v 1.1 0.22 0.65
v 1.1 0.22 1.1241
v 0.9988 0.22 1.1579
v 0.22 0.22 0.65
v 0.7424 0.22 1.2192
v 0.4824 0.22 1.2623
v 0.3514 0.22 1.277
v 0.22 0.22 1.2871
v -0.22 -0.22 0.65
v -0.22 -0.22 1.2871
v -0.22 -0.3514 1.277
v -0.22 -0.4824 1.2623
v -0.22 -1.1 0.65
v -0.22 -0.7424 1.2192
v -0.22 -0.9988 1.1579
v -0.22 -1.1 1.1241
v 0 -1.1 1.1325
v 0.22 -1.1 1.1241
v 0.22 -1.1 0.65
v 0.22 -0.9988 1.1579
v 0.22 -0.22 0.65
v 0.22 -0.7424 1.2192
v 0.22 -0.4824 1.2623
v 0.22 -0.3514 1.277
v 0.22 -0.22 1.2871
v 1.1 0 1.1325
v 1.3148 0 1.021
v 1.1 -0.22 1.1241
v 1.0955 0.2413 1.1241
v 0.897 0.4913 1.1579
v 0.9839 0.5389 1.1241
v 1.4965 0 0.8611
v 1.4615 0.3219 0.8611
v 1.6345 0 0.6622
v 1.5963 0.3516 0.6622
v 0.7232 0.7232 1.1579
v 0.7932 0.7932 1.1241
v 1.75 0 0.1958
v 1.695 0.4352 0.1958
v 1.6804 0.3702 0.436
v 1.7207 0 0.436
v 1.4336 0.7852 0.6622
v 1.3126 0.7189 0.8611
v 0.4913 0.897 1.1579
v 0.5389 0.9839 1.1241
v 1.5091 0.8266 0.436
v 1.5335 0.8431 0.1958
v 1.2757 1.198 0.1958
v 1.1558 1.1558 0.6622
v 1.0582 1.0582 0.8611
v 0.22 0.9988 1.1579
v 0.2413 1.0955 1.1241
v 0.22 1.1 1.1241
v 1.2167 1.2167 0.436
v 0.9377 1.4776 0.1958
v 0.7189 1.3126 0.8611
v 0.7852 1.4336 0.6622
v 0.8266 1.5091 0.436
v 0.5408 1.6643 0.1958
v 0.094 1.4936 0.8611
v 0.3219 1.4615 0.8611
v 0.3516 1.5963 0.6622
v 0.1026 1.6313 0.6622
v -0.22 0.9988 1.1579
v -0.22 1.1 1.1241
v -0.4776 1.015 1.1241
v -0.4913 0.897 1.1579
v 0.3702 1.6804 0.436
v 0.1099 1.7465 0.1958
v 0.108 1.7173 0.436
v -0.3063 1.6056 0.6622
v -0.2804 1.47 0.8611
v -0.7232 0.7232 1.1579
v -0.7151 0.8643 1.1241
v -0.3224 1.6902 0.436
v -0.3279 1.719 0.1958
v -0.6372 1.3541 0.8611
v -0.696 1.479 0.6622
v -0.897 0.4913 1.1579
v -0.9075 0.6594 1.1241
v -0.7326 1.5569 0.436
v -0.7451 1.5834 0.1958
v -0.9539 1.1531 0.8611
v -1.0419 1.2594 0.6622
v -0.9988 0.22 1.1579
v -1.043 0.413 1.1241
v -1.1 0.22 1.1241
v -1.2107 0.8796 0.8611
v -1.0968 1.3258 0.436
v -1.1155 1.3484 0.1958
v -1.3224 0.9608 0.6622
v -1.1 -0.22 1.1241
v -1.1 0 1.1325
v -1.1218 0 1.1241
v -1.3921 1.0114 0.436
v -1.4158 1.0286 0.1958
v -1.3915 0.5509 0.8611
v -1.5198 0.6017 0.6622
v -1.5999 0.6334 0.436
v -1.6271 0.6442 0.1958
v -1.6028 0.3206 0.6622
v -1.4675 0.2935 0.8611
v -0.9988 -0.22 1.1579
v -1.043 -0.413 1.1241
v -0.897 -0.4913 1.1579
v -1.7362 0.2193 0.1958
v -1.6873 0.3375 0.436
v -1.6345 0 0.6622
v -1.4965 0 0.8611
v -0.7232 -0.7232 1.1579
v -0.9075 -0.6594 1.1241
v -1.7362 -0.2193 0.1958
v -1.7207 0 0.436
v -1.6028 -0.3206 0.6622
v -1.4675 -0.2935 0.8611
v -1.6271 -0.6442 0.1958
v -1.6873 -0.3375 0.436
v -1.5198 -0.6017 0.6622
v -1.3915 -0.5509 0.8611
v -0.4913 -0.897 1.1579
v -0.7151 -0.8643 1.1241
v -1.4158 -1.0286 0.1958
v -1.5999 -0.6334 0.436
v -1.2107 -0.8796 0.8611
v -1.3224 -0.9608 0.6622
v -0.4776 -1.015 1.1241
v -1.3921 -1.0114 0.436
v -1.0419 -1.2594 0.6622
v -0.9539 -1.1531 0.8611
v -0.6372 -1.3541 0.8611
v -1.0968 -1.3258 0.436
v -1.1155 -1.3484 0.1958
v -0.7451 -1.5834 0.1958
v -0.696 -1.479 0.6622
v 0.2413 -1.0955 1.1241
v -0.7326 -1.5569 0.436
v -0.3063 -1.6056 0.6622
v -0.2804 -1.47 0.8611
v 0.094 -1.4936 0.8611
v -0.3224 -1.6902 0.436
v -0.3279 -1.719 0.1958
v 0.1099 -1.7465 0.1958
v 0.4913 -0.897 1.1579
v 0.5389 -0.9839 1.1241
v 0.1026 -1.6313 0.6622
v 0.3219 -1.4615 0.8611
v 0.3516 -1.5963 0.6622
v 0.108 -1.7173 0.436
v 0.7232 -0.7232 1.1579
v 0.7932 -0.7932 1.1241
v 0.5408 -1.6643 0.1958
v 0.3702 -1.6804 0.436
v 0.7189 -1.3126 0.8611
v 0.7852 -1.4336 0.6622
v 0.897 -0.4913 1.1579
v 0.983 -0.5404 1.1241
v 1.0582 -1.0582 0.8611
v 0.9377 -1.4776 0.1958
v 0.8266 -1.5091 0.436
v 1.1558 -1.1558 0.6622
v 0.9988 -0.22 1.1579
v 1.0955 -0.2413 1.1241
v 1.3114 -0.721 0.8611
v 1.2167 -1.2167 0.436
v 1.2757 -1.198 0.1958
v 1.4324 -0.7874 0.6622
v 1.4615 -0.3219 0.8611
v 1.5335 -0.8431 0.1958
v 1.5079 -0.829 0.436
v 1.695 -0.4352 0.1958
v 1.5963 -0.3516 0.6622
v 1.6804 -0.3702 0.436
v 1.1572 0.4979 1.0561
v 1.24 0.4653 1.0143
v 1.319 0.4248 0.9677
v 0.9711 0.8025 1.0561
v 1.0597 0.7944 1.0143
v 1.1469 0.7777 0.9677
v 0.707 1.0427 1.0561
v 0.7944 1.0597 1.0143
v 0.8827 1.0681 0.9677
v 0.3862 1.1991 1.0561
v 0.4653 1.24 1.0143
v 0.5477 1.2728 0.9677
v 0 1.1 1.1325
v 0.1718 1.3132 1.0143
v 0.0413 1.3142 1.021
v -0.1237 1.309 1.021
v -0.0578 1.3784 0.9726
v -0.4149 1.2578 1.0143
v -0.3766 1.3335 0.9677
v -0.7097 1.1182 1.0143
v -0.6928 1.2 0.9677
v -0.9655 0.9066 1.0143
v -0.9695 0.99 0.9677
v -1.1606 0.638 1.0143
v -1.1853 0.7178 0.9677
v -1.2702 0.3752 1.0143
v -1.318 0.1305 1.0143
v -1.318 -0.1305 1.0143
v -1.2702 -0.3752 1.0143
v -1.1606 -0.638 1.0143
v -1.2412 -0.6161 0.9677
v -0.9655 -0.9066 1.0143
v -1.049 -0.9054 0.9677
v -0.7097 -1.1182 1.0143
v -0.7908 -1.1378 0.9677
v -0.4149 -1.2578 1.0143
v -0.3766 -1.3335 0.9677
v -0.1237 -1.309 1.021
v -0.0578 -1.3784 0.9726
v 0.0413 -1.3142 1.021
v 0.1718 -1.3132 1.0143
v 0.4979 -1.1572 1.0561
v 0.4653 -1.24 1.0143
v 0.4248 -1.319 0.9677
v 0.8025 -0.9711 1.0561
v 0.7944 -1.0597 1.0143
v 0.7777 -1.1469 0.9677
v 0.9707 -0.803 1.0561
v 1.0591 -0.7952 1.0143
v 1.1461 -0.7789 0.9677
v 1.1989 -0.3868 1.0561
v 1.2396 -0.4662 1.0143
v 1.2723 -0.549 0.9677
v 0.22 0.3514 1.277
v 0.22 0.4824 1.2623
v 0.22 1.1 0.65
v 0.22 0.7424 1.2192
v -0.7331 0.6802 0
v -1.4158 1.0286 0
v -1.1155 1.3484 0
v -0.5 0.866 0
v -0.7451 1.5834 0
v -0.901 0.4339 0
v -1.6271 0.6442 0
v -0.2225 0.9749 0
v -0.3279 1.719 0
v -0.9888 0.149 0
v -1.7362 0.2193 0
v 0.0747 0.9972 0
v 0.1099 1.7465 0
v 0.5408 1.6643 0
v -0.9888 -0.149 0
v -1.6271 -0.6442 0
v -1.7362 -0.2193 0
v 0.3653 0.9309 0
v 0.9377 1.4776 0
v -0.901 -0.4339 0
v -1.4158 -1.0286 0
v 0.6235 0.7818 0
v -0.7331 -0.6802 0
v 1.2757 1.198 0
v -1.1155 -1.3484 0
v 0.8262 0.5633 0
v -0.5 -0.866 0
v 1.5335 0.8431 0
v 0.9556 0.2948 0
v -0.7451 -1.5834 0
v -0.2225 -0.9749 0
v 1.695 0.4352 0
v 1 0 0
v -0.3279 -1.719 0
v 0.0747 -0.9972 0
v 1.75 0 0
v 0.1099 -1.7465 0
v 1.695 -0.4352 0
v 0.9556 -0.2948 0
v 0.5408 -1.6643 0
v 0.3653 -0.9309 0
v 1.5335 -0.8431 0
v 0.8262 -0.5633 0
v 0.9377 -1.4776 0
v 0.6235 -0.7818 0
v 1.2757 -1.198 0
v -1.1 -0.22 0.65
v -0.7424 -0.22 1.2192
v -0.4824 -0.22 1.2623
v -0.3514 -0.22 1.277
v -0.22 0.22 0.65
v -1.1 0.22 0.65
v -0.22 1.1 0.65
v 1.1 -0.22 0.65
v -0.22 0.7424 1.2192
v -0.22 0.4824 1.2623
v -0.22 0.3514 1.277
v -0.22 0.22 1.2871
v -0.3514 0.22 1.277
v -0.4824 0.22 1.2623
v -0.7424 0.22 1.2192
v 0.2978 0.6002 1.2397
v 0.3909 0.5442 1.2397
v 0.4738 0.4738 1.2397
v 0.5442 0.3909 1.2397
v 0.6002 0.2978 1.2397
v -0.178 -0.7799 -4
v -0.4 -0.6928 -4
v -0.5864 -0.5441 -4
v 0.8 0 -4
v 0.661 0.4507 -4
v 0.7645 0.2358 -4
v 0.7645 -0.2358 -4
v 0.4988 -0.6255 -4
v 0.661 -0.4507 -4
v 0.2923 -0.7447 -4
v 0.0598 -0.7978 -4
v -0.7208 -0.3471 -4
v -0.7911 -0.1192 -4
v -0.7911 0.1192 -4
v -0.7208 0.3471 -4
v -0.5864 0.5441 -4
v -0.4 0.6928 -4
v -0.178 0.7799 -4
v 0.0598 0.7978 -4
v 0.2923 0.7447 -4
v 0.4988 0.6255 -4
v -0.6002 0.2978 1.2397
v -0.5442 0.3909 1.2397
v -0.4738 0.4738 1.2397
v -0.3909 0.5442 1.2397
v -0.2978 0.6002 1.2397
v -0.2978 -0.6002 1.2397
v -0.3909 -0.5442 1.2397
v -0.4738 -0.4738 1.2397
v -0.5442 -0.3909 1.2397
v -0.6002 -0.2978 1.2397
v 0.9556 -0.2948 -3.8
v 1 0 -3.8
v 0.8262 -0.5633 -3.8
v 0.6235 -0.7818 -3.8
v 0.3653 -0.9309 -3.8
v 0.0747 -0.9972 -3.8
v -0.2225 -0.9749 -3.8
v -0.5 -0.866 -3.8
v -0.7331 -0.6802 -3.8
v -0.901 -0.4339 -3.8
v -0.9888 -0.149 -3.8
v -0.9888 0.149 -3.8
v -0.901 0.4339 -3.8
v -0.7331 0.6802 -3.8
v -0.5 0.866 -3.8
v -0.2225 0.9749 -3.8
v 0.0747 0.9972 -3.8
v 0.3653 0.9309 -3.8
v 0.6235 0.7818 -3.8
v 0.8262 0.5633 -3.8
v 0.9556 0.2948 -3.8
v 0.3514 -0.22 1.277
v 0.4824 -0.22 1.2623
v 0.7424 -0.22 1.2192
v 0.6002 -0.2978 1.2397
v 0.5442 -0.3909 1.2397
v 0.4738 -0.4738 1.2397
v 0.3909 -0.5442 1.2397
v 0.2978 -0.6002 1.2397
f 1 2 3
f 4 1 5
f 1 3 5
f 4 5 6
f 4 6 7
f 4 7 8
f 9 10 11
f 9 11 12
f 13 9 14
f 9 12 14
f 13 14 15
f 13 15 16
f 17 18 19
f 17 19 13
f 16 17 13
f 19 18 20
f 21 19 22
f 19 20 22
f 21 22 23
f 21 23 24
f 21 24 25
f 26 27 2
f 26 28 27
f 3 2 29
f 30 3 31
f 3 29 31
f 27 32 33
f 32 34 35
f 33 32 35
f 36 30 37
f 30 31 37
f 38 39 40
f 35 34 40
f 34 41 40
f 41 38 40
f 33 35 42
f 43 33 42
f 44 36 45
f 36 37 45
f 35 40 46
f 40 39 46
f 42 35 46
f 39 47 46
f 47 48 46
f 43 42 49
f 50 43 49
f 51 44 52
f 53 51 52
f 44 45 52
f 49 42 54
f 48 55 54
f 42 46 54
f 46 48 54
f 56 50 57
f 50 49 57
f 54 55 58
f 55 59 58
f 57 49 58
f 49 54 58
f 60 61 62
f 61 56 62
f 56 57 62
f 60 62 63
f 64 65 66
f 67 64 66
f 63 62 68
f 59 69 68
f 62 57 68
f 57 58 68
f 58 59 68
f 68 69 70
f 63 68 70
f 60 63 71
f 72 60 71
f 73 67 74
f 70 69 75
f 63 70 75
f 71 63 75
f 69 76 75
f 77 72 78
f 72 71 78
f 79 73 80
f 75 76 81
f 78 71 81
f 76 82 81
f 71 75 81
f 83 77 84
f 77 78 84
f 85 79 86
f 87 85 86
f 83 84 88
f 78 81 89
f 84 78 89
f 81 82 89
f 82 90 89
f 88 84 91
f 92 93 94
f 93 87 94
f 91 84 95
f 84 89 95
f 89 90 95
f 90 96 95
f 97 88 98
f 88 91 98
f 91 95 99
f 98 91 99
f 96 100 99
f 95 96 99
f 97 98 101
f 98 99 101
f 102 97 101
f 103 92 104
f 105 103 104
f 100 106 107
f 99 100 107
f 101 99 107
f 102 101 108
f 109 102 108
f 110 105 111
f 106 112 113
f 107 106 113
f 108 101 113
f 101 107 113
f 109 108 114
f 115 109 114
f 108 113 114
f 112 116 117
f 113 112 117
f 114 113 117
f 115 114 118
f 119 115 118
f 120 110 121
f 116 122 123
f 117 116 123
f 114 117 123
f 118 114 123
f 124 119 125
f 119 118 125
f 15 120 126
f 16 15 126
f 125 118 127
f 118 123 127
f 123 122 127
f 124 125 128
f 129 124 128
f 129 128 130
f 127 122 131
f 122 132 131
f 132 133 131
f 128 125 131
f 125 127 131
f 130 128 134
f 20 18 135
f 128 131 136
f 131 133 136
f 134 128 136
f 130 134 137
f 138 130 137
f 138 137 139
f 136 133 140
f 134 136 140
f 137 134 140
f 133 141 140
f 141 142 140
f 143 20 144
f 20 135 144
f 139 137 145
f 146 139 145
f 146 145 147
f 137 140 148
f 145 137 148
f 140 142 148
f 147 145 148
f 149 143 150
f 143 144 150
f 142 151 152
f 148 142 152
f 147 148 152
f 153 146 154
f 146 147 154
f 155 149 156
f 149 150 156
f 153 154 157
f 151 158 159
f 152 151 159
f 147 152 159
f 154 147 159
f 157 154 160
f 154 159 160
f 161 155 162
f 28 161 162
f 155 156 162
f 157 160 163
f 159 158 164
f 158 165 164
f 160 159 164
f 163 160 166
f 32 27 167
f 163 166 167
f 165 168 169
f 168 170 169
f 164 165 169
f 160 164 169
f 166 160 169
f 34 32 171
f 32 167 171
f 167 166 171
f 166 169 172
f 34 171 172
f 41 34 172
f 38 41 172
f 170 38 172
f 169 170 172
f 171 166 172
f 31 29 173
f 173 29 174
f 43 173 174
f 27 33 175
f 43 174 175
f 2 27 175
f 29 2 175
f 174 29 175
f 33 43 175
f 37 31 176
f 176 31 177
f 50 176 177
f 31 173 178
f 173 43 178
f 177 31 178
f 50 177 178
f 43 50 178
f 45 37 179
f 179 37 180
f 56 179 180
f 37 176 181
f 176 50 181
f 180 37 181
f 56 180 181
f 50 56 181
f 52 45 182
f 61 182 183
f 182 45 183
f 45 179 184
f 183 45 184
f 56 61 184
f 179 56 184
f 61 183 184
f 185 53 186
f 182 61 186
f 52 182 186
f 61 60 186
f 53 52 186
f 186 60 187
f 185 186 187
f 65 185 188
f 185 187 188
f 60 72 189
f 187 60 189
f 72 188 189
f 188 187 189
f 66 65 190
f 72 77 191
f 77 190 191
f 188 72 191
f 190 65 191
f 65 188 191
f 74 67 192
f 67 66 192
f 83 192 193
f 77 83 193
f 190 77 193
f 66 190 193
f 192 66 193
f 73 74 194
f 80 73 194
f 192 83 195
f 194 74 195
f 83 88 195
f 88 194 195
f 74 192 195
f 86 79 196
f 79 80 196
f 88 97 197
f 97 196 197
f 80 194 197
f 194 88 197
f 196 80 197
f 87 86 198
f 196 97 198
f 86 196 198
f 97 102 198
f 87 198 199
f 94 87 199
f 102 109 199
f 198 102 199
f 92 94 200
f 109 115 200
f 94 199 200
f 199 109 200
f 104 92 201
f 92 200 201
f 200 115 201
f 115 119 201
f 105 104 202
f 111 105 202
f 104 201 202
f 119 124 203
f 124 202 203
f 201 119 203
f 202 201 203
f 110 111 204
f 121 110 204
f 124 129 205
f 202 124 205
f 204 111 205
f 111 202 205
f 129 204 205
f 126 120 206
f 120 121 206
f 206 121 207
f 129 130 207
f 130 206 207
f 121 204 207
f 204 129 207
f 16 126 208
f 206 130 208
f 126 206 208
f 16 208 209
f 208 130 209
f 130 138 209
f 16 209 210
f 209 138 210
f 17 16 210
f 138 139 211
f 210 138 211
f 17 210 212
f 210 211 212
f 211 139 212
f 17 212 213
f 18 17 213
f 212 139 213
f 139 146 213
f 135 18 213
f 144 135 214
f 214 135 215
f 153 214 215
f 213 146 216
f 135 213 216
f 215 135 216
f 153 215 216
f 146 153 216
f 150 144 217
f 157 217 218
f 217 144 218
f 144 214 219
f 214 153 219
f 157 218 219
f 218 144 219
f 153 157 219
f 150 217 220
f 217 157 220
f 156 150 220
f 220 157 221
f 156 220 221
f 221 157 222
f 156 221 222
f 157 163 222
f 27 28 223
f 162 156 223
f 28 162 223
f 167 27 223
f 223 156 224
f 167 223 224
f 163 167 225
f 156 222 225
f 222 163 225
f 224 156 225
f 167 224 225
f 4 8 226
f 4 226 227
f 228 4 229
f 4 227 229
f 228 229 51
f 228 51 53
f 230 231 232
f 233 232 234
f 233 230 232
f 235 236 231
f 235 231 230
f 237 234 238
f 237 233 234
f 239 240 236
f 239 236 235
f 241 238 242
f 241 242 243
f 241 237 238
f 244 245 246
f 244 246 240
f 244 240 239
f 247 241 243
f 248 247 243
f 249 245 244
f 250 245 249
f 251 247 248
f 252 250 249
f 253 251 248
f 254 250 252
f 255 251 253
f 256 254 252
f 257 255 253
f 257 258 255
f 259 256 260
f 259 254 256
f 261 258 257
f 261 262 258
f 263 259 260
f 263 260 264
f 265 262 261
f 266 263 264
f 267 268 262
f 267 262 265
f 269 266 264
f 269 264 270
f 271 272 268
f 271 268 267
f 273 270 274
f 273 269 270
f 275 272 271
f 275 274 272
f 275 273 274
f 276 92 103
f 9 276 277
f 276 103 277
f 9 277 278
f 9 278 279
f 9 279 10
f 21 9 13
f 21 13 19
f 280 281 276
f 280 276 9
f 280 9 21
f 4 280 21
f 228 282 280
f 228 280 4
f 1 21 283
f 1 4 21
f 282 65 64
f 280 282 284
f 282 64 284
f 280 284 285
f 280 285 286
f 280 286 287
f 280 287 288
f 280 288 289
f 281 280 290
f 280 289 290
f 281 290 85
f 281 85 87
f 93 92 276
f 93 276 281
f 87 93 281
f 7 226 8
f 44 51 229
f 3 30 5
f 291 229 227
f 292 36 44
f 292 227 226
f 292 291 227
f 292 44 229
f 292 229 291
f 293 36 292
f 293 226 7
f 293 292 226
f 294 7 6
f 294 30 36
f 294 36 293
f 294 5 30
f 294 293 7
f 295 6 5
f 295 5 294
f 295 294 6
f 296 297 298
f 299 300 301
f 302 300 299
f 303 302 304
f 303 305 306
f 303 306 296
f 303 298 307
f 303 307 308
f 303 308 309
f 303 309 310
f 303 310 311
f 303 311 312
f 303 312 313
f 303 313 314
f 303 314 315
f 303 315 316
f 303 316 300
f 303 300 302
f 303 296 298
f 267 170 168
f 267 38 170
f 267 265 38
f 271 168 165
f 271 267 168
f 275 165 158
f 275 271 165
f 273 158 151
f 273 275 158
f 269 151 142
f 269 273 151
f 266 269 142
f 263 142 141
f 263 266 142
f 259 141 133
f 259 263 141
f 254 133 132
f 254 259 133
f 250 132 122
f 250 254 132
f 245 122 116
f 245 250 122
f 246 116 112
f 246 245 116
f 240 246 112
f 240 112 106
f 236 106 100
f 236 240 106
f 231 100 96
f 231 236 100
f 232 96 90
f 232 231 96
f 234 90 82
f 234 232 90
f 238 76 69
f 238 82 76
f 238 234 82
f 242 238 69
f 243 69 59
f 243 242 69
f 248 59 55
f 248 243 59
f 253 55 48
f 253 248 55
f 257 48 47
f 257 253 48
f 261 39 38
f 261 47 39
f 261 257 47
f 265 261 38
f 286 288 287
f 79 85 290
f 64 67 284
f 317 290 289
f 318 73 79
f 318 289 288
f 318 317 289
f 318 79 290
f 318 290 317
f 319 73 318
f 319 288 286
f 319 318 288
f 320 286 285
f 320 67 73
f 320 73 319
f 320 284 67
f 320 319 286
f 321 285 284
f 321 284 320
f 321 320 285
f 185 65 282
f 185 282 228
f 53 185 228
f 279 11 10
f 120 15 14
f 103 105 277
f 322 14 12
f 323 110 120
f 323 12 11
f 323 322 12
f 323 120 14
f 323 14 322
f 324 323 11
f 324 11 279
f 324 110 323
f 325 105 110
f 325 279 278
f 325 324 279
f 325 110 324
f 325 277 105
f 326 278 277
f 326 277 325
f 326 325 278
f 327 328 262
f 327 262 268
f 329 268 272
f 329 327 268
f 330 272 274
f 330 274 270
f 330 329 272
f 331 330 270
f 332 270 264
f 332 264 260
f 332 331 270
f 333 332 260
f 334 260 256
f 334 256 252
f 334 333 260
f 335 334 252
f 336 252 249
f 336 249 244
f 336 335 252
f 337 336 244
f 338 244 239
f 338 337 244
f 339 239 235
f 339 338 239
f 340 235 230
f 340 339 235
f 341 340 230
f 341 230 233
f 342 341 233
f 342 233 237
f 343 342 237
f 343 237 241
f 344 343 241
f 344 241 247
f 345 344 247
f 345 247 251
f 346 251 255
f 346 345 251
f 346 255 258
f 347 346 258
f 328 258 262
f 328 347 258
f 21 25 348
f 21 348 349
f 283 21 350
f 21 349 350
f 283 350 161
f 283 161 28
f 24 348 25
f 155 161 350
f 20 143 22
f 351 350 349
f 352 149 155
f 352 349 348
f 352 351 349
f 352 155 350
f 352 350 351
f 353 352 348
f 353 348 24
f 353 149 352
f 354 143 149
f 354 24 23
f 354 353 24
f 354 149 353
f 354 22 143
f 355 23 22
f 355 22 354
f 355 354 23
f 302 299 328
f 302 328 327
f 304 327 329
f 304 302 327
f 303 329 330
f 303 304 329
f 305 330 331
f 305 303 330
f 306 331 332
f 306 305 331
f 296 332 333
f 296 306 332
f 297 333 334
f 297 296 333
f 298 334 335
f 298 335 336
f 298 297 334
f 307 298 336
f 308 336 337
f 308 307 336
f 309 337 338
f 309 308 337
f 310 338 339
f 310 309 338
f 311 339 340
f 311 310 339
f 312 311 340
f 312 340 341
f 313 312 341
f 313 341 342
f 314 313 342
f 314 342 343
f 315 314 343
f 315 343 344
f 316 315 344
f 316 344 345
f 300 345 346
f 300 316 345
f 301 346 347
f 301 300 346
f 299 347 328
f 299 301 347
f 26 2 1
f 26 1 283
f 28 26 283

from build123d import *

# Parameters (mm, degrees)
CUT_EXTRUDE2_DEPTH = 0.65
CHAMFER1_SIZE      = 0.2


with BuildPart() as part:
    # Sketch1 → Revolve1 (revolve)
    with BuildSketch(Plane(origin=(0, 0, 0), x_dir=(0, 0, -1), z_dir=(1, 0, 0)), mode=Mode.PRIVATE) as revolve1_sk:
        with BuildLine():
            Line((-0.866666667, 1.75), (0, 1.75))
            Line((0, 1.75), (0, 1))
            Line((0, 1), (4, 1))
            Line((4, 1), (4, 0))
            Line((4, 0), (-1.3, 0))
            ThreePointArc((-1.3, 0), (-1.190055087, 0.901426339), (-0.866666667, 1.75))
        make_face()
    revolve(revolve1_sk.sketch.rotate(Axis((0, 0, 33.735969773), (0, 0, -1)), 90), axis=Axis((0, 0, 33.735969773), (0, 0, -1)))

    # Sketch2 → Cut-Extrude2 (cut)
    with BuildSketch(Plane(origin=(0, 0, 1.3), x_dir=(-1, 0, 0), z_dir=(0, 0, -1))):
        Polygon((0, 1.1), (0.22, 1.1), (0.22, 0.22), (1.1, 0.22), (1.1, 0), (1.1, -0.22), (0.22, -0.22), (0.22, -1.1), (0, -1.1), (-0.22, -1.1), (-0.22, -0.22), (-1.1, -0.22), (-1.1, 0), (-1.1, 0.22), (-0.22, 0.22), (-0.22, 1.1), align=None)
    extrude(amount=CUT_EXTRUDE2_DEPTH, mode=Mode.SUBTRACT)

    # Fillet1: read off the stored shape, not the designer's step
    # Fillet1 outline → Fillet1 (revolve, cut)
    with BuildSketch(Plane.XZ):
        with BuildLine():
            Line((1.75, 1.157864333), (1.02269549, 1.157864333))
            ThreePointArc((1.02269549, 1.157864333), (1.547714075, 0.798799804), (1.75, 0.195763938))
            Line((1.75, 0.195763938), (1.75, 1.157864333))
        make_face()
    revolve(axis=Axis((0, 0, 0), (0, 0, 1)), mode=Mode.SUBTRACT)

    # Chamfer1
    chamfer1_edges = [part.edges().sort_by_distance(p)[0] for p in [
        (-1, 0, -4),
    ]]
    chamfer(chamfer1_edges, length=CHAMFER1_SIZE)


solid = part.part
